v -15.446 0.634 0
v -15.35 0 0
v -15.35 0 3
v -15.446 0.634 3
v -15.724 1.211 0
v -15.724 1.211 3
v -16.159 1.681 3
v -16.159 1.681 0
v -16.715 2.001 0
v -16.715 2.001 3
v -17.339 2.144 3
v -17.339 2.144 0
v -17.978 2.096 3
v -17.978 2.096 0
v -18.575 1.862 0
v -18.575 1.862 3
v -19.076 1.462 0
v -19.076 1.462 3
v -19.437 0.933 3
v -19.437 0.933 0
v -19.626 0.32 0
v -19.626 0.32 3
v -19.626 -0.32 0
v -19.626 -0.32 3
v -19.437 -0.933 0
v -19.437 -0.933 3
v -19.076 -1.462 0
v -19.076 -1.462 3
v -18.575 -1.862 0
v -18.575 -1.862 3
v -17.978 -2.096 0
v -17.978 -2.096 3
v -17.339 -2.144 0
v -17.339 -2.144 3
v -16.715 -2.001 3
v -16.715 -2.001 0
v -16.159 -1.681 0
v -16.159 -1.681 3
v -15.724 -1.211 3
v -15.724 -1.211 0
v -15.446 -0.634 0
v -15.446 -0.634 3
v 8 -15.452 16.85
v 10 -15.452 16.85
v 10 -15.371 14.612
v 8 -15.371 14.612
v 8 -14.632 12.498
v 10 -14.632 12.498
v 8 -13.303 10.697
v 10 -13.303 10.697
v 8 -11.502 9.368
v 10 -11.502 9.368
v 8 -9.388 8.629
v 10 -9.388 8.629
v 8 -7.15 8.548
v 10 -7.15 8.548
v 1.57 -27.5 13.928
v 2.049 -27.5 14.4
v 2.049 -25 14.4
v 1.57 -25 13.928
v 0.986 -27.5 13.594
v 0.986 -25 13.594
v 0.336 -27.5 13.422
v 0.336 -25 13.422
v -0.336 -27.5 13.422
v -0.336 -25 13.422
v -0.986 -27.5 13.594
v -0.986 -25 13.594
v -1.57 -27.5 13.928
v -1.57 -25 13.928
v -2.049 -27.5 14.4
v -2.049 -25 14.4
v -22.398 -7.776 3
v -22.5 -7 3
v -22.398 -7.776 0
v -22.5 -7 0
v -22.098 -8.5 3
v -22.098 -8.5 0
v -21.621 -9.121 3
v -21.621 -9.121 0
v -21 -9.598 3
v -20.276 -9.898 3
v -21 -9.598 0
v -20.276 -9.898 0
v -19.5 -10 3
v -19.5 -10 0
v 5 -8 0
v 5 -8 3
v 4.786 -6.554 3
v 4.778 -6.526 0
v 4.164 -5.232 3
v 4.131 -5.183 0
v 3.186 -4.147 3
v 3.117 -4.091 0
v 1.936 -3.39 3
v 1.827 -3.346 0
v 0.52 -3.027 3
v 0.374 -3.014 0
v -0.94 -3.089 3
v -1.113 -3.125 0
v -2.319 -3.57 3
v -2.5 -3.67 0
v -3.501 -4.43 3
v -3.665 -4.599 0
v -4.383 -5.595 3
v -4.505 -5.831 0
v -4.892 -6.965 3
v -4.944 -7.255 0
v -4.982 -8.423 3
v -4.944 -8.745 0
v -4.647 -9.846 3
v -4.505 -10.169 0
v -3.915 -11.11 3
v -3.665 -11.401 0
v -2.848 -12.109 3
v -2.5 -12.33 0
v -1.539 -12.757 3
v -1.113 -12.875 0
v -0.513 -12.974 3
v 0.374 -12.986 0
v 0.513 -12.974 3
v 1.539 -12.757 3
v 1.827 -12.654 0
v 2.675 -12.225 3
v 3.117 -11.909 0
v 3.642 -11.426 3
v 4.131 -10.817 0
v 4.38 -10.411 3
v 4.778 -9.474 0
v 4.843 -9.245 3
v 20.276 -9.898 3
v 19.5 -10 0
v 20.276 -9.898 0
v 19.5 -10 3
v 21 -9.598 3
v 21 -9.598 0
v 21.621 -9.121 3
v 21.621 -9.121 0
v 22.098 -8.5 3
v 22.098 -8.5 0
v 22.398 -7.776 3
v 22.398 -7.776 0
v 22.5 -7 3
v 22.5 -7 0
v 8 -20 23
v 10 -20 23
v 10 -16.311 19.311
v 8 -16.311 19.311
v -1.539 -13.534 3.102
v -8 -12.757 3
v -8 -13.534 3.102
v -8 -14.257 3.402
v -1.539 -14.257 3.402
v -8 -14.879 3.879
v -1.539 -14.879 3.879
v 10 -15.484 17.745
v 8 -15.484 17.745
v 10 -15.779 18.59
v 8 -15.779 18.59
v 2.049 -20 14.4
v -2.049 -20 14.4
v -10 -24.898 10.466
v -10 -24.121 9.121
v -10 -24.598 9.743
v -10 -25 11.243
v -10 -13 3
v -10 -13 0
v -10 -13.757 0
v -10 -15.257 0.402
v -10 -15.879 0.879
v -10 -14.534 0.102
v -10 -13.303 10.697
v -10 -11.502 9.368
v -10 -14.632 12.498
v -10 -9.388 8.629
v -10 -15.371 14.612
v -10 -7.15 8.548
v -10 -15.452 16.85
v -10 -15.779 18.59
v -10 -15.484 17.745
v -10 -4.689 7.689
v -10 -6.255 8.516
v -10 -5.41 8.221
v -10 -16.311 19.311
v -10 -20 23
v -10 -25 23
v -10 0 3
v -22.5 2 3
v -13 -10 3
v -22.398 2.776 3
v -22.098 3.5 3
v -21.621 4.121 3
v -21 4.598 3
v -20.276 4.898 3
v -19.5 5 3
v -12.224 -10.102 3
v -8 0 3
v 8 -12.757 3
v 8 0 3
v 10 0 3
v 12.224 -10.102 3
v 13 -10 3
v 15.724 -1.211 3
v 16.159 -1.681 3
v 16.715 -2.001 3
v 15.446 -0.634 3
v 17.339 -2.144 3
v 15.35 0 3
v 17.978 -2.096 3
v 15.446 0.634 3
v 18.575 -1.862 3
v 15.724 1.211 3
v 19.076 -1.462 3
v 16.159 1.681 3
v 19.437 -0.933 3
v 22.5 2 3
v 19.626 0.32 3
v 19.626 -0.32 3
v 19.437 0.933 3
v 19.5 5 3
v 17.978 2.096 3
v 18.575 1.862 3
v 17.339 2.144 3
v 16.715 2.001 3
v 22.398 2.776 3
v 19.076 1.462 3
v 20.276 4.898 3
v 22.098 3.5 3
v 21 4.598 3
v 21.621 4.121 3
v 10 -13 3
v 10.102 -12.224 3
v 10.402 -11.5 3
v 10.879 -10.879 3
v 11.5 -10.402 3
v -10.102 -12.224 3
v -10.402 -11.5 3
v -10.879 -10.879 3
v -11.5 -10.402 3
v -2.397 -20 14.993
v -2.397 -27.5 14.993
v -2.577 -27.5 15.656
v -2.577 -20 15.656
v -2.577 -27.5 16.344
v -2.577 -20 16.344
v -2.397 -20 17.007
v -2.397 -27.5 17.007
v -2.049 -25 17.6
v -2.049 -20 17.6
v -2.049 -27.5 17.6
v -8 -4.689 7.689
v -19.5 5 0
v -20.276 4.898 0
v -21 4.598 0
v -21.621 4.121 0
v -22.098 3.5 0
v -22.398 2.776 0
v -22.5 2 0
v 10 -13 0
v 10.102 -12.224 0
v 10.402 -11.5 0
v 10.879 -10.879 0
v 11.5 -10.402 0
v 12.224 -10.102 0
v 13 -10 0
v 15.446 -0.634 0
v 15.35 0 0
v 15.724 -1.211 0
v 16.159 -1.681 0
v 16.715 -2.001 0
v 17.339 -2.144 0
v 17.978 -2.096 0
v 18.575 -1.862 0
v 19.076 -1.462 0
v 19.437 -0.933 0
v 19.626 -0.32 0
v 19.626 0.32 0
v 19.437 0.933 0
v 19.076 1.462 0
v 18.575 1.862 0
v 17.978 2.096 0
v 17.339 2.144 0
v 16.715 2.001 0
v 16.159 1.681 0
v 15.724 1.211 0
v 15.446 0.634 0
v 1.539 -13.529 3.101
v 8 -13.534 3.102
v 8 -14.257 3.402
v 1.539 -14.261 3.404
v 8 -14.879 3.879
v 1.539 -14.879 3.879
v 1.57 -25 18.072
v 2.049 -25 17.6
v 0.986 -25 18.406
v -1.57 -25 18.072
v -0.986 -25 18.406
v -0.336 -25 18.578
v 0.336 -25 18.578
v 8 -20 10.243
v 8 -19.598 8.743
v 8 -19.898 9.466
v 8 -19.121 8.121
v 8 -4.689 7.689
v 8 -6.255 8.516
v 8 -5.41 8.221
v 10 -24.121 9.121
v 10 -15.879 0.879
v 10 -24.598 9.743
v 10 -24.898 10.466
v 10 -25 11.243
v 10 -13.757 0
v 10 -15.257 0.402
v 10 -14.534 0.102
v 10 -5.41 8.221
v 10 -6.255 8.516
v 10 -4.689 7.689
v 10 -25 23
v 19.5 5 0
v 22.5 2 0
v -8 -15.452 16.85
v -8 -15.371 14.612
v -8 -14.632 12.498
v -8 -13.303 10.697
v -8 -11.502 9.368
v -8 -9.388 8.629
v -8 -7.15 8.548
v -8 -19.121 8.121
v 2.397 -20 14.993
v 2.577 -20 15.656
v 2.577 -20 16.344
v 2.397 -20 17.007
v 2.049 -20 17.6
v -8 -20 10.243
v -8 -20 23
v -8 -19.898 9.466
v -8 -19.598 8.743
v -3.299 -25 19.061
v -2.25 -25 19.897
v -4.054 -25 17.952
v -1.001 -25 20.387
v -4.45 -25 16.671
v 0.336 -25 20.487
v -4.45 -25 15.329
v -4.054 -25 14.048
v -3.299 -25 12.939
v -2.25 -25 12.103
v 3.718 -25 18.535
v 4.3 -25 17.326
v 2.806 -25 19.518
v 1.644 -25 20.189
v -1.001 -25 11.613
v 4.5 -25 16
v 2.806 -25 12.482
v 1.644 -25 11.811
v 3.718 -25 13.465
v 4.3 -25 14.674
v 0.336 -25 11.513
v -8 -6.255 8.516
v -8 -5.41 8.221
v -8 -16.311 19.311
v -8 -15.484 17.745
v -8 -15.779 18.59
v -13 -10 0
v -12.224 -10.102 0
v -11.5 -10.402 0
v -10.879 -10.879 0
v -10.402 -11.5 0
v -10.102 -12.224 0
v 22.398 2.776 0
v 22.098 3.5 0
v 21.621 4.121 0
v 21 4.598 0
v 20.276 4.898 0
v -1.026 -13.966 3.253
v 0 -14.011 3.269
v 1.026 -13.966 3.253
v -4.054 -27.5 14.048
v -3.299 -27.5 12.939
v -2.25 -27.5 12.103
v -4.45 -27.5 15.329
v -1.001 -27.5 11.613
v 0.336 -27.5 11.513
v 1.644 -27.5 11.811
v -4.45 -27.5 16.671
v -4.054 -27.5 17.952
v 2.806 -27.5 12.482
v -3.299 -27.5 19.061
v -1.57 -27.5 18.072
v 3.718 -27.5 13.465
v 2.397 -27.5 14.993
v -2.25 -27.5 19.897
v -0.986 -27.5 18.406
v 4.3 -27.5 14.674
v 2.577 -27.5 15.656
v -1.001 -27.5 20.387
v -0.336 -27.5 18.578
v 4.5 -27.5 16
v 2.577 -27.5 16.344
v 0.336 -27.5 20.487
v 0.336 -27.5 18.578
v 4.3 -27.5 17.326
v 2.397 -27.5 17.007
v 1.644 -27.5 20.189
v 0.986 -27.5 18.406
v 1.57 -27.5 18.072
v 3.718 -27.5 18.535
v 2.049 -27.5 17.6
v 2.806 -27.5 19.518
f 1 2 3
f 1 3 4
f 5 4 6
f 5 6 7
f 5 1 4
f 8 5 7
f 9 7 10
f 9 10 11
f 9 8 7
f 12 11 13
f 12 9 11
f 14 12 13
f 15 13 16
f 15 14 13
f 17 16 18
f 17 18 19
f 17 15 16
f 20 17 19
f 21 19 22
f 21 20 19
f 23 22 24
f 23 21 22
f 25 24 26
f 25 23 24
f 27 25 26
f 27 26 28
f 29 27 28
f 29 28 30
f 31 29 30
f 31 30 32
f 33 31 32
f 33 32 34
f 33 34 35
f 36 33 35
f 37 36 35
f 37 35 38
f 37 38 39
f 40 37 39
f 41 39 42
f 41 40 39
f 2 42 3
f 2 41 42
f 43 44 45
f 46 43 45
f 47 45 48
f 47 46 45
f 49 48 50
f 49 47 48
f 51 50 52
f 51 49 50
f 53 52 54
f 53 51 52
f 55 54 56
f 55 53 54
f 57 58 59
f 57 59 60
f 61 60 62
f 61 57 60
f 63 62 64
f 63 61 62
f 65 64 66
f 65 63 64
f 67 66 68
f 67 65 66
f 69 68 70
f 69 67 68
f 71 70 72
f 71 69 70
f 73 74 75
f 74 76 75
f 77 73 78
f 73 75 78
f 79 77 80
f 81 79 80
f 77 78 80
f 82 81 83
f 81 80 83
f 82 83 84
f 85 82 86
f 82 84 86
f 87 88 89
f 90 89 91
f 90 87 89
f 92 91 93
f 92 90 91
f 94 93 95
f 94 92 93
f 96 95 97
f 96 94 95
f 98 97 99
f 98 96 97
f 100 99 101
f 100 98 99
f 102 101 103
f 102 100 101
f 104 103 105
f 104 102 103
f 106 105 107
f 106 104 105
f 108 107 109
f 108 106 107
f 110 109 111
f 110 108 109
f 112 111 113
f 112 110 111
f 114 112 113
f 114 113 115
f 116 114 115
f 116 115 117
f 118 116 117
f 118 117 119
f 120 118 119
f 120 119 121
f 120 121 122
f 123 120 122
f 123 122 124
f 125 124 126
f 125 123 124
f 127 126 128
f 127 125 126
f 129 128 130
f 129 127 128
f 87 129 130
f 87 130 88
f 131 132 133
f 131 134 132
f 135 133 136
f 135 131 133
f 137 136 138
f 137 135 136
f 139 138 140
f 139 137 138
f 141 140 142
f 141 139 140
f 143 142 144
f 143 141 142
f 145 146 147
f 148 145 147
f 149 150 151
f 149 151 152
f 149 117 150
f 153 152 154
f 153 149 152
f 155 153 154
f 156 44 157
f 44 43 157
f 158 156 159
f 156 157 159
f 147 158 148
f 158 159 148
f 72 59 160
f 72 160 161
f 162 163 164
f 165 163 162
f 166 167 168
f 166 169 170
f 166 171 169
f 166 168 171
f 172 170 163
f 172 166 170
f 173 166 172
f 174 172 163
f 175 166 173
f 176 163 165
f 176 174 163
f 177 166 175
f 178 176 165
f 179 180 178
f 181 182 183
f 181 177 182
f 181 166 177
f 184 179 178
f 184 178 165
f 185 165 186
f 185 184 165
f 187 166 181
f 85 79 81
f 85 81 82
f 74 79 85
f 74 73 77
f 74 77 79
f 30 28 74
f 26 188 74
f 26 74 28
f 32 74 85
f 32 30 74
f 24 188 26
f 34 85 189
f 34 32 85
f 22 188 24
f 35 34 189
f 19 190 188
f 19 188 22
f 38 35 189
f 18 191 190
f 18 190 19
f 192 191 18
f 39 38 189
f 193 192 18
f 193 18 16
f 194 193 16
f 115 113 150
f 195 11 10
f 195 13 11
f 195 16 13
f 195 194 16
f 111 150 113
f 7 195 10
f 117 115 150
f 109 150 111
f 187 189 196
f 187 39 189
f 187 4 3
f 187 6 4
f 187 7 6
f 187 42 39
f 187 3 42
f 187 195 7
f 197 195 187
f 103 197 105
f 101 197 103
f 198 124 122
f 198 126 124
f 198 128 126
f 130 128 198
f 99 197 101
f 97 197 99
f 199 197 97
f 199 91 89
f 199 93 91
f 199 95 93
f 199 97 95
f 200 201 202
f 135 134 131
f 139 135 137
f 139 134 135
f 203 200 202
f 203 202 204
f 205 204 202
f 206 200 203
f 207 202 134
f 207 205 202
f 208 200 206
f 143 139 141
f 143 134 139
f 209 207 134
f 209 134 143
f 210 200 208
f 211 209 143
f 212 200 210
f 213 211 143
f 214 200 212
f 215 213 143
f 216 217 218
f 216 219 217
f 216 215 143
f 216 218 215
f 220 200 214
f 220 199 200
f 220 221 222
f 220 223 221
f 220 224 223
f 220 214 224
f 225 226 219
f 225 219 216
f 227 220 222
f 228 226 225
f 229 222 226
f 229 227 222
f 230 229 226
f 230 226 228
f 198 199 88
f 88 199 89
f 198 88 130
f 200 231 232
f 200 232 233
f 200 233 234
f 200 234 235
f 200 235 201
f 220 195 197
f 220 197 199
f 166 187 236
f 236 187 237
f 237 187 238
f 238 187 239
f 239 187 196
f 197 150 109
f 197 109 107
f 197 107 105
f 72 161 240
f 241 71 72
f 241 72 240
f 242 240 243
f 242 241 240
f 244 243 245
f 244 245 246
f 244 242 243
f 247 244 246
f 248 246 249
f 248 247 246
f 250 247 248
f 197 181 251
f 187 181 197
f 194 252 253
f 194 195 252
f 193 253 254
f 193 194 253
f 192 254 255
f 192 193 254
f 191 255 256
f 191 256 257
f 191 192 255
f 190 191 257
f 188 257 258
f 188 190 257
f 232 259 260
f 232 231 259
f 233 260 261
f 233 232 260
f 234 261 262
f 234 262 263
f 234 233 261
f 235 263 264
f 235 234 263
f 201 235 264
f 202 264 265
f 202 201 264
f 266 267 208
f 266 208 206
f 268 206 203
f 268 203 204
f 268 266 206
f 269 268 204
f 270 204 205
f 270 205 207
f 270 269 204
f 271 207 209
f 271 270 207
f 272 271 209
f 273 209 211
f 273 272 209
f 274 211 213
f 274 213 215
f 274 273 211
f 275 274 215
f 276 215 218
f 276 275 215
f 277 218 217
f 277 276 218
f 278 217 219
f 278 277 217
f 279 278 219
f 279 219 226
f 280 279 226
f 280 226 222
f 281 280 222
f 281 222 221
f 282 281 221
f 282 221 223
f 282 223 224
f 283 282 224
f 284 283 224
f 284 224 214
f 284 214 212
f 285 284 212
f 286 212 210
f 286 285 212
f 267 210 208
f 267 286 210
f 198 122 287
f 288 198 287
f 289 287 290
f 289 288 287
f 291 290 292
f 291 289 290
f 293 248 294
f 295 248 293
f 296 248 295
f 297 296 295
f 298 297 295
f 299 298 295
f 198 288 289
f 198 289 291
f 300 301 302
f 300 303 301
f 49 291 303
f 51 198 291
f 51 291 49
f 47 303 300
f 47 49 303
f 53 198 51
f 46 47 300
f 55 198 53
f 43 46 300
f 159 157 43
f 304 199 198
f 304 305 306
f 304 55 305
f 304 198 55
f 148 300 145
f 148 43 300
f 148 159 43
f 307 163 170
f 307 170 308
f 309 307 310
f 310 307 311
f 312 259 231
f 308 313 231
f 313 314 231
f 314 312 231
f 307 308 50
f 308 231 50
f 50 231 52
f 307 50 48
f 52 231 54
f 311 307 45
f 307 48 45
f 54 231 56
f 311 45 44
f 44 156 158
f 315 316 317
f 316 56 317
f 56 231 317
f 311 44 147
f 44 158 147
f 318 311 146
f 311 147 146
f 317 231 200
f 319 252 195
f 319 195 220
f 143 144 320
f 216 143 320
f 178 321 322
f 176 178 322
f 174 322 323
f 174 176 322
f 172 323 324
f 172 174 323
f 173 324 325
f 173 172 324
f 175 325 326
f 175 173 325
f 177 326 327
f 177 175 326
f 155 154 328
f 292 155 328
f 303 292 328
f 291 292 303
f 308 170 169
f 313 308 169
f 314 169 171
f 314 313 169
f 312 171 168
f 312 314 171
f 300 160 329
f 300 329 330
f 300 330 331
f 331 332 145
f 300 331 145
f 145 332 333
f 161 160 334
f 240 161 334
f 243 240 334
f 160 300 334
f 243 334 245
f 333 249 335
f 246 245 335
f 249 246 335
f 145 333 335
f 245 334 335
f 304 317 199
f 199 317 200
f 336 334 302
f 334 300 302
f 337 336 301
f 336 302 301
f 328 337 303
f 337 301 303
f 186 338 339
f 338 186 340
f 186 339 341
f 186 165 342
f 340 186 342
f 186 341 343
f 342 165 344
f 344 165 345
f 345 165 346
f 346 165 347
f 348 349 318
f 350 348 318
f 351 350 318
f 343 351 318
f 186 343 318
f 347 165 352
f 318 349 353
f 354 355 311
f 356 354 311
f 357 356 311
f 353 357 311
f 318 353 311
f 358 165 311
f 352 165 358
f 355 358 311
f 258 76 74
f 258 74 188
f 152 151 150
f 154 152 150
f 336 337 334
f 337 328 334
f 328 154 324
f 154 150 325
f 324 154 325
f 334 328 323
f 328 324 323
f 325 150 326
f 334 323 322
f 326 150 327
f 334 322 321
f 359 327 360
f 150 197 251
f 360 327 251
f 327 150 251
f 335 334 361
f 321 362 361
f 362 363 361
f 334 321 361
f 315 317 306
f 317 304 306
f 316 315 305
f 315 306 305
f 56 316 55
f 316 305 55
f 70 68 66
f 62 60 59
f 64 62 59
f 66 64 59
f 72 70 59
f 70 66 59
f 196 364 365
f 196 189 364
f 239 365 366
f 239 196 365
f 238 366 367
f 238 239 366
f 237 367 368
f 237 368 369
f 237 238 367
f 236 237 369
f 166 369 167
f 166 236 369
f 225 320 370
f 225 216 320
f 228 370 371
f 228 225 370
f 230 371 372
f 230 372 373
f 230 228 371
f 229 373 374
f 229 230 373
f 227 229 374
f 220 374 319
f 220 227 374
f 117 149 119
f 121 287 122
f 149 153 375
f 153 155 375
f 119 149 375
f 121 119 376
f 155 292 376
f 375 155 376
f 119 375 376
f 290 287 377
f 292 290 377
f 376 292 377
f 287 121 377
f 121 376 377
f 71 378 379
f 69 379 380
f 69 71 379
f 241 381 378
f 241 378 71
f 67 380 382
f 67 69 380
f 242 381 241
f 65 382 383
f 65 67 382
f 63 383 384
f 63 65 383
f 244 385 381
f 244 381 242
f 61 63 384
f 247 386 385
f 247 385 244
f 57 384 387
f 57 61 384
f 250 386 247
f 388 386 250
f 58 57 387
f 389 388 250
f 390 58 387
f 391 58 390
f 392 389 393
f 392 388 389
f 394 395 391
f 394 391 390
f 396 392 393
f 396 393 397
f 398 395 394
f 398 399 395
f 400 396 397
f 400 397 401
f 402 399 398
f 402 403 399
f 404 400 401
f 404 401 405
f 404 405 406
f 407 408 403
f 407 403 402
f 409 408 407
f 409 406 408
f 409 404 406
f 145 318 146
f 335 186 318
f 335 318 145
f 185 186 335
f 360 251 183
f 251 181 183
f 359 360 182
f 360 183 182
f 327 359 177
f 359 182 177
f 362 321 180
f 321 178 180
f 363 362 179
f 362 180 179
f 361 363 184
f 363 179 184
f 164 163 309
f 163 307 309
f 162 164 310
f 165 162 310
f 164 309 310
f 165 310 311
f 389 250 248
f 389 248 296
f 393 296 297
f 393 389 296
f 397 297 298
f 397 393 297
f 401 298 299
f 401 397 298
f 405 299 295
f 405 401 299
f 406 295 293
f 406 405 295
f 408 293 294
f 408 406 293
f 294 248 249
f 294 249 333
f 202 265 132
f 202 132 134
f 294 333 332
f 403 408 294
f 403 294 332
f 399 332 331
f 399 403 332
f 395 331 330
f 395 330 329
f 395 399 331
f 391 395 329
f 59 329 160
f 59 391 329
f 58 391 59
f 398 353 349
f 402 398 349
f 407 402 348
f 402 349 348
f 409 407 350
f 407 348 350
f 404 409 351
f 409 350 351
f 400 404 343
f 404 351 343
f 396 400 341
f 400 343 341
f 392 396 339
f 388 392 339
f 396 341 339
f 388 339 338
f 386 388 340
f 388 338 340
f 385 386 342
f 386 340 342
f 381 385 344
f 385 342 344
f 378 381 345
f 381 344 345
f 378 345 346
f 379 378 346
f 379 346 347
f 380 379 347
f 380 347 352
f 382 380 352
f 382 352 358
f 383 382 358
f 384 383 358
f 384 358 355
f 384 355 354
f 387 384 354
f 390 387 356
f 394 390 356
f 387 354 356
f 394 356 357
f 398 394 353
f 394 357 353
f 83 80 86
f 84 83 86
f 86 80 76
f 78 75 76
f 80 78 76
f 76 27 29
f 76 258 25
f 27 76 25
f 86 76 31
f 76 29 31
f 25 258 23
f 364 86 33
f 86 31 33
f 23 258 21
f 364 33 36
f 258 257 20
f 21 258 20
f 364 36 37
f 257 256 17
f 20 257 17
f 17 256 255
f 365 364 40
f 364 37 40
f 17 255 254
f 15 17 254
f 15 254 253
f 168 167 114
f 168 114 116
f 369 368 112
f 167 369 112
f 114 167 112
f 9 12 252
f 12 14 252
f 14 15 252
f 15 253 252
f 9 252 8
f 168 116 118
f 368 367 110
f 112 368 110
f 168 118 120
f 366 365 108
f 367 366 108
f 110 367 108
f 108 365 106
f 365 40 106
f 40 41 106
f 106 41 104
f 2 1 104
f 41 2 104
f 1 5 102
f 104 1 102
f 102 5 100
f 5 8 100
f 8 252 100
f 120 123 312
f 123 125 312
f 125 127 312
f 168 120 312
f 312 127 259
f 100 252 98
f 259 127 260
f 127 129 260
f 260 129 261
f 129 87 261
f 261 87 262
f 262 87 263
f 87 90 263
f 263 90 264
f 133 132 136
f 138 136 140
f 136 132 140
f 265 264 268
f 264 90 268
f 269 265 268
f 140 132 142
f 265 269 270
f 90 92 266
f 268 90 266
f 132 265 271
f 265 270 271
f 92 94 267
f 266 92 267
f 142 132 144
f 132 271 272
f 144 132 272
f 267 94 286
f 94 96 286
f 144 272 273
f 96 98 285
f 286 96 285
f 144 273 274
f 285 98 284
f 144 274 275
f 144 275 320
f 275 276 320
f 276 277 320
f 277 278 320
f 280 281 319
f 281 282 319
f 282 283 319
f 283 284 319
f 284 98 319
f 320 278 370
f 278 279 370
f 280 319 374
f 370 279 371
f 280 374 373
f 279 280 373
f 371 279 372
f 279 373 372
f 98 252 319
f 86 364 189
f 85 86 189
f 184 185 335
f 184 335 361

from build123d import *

# Parameters (mm, degrees)
SKETCH1_W               = 45
SKETCH1_H               = 30
SKETCH1_R               = 2.15
SKETCH1_R_2             = 5
BOSS_EXTRUDE1_DEPTH     = 3
SKETCH3_W               = 20
SKETCH3_H               = 5
EXTRUDE_THIN1_DEPTH     = 10
CUT_EXTRUDE1_DEPTH      = 41.746165464
BOSS_EXTRUDE2_DEPTH     = 2
SKETCH6_W               = 3
SKETCH6_H               = 15
CUT_EXTRUDE2_DEPTH      = 48.013295992
CHAMFER2_SIZE           = 6
CHAMFER1_SIZE           = 10
SKETCH8_R               = 4.5
SKETCH8_R_2             = 2.5
EXTRUDE_THIN3_DEPTH     = 2.5
MOVE_START              = -27.5
MOVE_FACE1_DEPTH        = 7.5
MOVE_FACE1_2_DEPTH      = 2.5
CUT_EXTRUDE3_DEPTH      = 43.32611487
CUT_EXTRUDE3_DEPTH_BACK = 43.32611487
SKETCH11_R              = 7.5
FILLET1_R               = 3


# Read off the part's stored shape, not the designer's step: Move Face1
with BuildPart() as part:
    # Sketch1 → Boss-Extrude1 (new body)
    with BuildSketch(Plane.XY):
        with Locations((0, -10)):
            Rectangle(SKETCH1_W, SKETCH1_H)
        with Locations((-17.5, 0)):
            Circle(SKETCH1_R, mode=Mode.SUBTRACT)
        with Locations(Location((17.5, 0, 0), (0, 0, 180))):
            Circle(SKETCH1_R, mode=Mode.SUBTRACT)
        with Locations((0, -8)):
            Circle(SKETCH1_R_2, mode=Mode.SUBTRACT)
    extrude(amount=BOSS_EXTRUDE1_DEPTH)

    # Sketch3 → Extrude-Thin1 (add, symmetric)
    with BuildSketch(Plane.ZY):
        with Locations((13, -22.5)):
            Rectangle(SKETCH3_W, SKETCH3_H)
    extrude(amount=EXTRUDE_THIN1_DEPTH, both=True)

    # Sketch4 → Cut-Extrude1 (cut, through all)
    with BuildSketch(Plane(origin=(0, -20, 0), x_dir=(1, 0, 0), z_dir=(0, 1, 0))):
        with BuildLine():
            Line((-2, -14.5), (2, -14.5))
            ThreePointArc((2, -14.5), (2.5, -16), (2, -17.5))
            Line((2, -17.5), (-2, -17.5))
            ThreePointArc((-2, -17.5), (-2.5, -16), (-2, -14.5))
        make_face()
    extrude(amount=-CUT_EXTRUDE1_DEPTH, mode=Mode.SUBTRACT)

    # Sketch5 → Boss-Extrude2 (add)
    with BuildSketch(Plane.ZY.offset(10)):
        Polygon((23, -20), (3, 0), (3, -20), align=None)
    boss_extrude2 = extrude(amount=-BOSS_EXTRUDE2_DEPTH)

    # Sketch6 → Cut-Extrude2 (cut, through all)
    with BuildSketch(Plane.ZY.offset(10)):
        with Locations((1.5, -17.5)):
            Rectangle(SKETCH6_W, SKETCH6_H)
    cut_extrude2 = extrude(amount=CUT_EXTRUDE2_DEPTH, mode=Mode.SUBTRACT)

    # Mirror1: Boss-Extrude2, Cut-Extrude2 across plane
    add(boss_extrude2.mirror(Plane(origin=(0, 0, 0), x_dir=(0, 0, 1), z_dir=(1, 0, 0))))
    add(cut_extrude2.mirror(Plane(origin=(0, 0, 0), x_dir=(0, 0, 1), z_dir=(1, 0, 0))), mode=Mode.SUBTRACT)

    # Chamfer2
    chamfer2_edges = [part.edges().sort_by_distance(p)[0] for p in [
        (0, -20, 3),
    ]]
    chamfer(chamfer2_edges, length=CHAMFER2_SIZE)

    # Chamfer1
    chamfer1_edges = [part.edges().sort_by_distance(p)[0] for p in [
        (0, -25, 0),
    ]]
    chamfer(chamfer1_edges, length=CHAMFER1_SIZE)

    # Sketch8 → Extrude-Thin3 (add)
    with BuildSketch(Plane.XZ.offset(25)):
        with Locations((0, 16)):
            Circle(SKETCH8_R)
        with Locations((0, 16)):
            Circle(SKETCH8_R_2, mode=Mode.SUBTRACT)
    extrude(amount=EXTRUDE_THIN3_DEPTH)

    # Move Face1 outline → Move Face1 (cut)
    with BuildSketch(Plane(origin=(0, 0, 0), x_dir=(1, 0, 0), z_dir=(0, 1, 0)).offset(MOVE_START)):
        with BuildLine():
            ThreePointArc((2.049390153, -17.6), (2.6, -16), (2.049390153, -14.4))
            Line((2.049390153, -14.4), (-2.049390153, -14.4))
            ThreePointArc((-2.049390153, -14.4), (-2.6, -16), (-2.049390153, -17.6))
            Line((-2.049390153, -17.6), (2.049390153, -17.6))
        make_face()
        with BuildLine():
            Line((2, -17.5), (-2, -17.5))
            ThreePointArc((-2, -17.5), (-2.5, -16), (-2, -14.5))
            Line((-2, -14.5), (2, -14.5))
            ThreePointArc((2, -14.5), (2.5, -16), (2, -17.5))
        make_face(mode=Mode.SUBTRACT)
    extrude(amount=MOVE_FACE1_DEPTH, mode=Mode.SUBTRACT)

    # Move Face1 2 outline → Move Face1 2 (cut)
    with BuildSketch(Plane(origin=(0, 0, 0), x_dir=(1, 0, 0), z_dir=(0, 1, 0)).offset(MOVE_START)):
        with BuildLine():
            Line((1.920937271, -14.4), (2.049390153, -14.4))
            ThreePointArc((2.049390153, -14.4), (0, -13.4), (-2.049390153, -14.4))
            Line((-2.049390153, -14.4), (-1.920937271, -14.4))
            ThreePointArc((-1.920937271, -14.4), (0, -13.5), (1.920937271, -14.4))
        make_face()
        with BuildLine():
            ThreePointArc((-2.049390153, -17.6), (0, -18.6), (2.049390153, -17.6))
            Line((2.049390153, -17.6), (1.920937271, -17.6))
            ThreePointArc((1.920937271, -17.6), (0, -18.5), (-1.920937271, -17.6))
            Line((-1.920937271, -17.6), (-2.049390153, -17.6))
        make_face()
    extrude(amount=MOVE_FACE1_2_DEPTH, mode=Mode.SUBTRACT)

    # Sketch11 → Cut-Extrude3 (cut, two sides: drawn at the far end of the back side and taken through both)
    with BuildSketch(Plane(origin=(0, 0, 0), x_dir=(0, 0, -1), z_dir=(1, 0, 0)).offset(-CUT_EXTRUDE3_DEPTH_BACK)):
        with Locations((-16, -8)):
            Circle(SKETCH11_R)
    extrude(amount=CUT_EXTRUDE3_DEPTH + CUT_EXTRUDE3_DEPTH_BACK, mode=Mode.SUBTRACT)

    # Fillet1
    fillet1_edges = [part.edges().sort_by_distance(p)[0] for p in [
        (0, -20, 9),
        (0, -14, 3),
        (0, -25, 10),
        (0, -15, 0),
        (-9, -15.177071733, 18.177071733),
        (-9, -5.822928267, 8.822928267),
        (9, -15.177071733, 18.177071733),
        (9, -5.822928267, 8.822928267),
        (-10, -10, 1.5),
        (-22.5, -10, 1.5),
        (-22.5, 5, 1.5),
        (22.5, 5, 1.5),
        (22.5, -10, 1.5),
        (10, -10, 1.5),
    ]]
    fillet(fillet1_edges, radius=FILLET1_R)


solid = part.part
